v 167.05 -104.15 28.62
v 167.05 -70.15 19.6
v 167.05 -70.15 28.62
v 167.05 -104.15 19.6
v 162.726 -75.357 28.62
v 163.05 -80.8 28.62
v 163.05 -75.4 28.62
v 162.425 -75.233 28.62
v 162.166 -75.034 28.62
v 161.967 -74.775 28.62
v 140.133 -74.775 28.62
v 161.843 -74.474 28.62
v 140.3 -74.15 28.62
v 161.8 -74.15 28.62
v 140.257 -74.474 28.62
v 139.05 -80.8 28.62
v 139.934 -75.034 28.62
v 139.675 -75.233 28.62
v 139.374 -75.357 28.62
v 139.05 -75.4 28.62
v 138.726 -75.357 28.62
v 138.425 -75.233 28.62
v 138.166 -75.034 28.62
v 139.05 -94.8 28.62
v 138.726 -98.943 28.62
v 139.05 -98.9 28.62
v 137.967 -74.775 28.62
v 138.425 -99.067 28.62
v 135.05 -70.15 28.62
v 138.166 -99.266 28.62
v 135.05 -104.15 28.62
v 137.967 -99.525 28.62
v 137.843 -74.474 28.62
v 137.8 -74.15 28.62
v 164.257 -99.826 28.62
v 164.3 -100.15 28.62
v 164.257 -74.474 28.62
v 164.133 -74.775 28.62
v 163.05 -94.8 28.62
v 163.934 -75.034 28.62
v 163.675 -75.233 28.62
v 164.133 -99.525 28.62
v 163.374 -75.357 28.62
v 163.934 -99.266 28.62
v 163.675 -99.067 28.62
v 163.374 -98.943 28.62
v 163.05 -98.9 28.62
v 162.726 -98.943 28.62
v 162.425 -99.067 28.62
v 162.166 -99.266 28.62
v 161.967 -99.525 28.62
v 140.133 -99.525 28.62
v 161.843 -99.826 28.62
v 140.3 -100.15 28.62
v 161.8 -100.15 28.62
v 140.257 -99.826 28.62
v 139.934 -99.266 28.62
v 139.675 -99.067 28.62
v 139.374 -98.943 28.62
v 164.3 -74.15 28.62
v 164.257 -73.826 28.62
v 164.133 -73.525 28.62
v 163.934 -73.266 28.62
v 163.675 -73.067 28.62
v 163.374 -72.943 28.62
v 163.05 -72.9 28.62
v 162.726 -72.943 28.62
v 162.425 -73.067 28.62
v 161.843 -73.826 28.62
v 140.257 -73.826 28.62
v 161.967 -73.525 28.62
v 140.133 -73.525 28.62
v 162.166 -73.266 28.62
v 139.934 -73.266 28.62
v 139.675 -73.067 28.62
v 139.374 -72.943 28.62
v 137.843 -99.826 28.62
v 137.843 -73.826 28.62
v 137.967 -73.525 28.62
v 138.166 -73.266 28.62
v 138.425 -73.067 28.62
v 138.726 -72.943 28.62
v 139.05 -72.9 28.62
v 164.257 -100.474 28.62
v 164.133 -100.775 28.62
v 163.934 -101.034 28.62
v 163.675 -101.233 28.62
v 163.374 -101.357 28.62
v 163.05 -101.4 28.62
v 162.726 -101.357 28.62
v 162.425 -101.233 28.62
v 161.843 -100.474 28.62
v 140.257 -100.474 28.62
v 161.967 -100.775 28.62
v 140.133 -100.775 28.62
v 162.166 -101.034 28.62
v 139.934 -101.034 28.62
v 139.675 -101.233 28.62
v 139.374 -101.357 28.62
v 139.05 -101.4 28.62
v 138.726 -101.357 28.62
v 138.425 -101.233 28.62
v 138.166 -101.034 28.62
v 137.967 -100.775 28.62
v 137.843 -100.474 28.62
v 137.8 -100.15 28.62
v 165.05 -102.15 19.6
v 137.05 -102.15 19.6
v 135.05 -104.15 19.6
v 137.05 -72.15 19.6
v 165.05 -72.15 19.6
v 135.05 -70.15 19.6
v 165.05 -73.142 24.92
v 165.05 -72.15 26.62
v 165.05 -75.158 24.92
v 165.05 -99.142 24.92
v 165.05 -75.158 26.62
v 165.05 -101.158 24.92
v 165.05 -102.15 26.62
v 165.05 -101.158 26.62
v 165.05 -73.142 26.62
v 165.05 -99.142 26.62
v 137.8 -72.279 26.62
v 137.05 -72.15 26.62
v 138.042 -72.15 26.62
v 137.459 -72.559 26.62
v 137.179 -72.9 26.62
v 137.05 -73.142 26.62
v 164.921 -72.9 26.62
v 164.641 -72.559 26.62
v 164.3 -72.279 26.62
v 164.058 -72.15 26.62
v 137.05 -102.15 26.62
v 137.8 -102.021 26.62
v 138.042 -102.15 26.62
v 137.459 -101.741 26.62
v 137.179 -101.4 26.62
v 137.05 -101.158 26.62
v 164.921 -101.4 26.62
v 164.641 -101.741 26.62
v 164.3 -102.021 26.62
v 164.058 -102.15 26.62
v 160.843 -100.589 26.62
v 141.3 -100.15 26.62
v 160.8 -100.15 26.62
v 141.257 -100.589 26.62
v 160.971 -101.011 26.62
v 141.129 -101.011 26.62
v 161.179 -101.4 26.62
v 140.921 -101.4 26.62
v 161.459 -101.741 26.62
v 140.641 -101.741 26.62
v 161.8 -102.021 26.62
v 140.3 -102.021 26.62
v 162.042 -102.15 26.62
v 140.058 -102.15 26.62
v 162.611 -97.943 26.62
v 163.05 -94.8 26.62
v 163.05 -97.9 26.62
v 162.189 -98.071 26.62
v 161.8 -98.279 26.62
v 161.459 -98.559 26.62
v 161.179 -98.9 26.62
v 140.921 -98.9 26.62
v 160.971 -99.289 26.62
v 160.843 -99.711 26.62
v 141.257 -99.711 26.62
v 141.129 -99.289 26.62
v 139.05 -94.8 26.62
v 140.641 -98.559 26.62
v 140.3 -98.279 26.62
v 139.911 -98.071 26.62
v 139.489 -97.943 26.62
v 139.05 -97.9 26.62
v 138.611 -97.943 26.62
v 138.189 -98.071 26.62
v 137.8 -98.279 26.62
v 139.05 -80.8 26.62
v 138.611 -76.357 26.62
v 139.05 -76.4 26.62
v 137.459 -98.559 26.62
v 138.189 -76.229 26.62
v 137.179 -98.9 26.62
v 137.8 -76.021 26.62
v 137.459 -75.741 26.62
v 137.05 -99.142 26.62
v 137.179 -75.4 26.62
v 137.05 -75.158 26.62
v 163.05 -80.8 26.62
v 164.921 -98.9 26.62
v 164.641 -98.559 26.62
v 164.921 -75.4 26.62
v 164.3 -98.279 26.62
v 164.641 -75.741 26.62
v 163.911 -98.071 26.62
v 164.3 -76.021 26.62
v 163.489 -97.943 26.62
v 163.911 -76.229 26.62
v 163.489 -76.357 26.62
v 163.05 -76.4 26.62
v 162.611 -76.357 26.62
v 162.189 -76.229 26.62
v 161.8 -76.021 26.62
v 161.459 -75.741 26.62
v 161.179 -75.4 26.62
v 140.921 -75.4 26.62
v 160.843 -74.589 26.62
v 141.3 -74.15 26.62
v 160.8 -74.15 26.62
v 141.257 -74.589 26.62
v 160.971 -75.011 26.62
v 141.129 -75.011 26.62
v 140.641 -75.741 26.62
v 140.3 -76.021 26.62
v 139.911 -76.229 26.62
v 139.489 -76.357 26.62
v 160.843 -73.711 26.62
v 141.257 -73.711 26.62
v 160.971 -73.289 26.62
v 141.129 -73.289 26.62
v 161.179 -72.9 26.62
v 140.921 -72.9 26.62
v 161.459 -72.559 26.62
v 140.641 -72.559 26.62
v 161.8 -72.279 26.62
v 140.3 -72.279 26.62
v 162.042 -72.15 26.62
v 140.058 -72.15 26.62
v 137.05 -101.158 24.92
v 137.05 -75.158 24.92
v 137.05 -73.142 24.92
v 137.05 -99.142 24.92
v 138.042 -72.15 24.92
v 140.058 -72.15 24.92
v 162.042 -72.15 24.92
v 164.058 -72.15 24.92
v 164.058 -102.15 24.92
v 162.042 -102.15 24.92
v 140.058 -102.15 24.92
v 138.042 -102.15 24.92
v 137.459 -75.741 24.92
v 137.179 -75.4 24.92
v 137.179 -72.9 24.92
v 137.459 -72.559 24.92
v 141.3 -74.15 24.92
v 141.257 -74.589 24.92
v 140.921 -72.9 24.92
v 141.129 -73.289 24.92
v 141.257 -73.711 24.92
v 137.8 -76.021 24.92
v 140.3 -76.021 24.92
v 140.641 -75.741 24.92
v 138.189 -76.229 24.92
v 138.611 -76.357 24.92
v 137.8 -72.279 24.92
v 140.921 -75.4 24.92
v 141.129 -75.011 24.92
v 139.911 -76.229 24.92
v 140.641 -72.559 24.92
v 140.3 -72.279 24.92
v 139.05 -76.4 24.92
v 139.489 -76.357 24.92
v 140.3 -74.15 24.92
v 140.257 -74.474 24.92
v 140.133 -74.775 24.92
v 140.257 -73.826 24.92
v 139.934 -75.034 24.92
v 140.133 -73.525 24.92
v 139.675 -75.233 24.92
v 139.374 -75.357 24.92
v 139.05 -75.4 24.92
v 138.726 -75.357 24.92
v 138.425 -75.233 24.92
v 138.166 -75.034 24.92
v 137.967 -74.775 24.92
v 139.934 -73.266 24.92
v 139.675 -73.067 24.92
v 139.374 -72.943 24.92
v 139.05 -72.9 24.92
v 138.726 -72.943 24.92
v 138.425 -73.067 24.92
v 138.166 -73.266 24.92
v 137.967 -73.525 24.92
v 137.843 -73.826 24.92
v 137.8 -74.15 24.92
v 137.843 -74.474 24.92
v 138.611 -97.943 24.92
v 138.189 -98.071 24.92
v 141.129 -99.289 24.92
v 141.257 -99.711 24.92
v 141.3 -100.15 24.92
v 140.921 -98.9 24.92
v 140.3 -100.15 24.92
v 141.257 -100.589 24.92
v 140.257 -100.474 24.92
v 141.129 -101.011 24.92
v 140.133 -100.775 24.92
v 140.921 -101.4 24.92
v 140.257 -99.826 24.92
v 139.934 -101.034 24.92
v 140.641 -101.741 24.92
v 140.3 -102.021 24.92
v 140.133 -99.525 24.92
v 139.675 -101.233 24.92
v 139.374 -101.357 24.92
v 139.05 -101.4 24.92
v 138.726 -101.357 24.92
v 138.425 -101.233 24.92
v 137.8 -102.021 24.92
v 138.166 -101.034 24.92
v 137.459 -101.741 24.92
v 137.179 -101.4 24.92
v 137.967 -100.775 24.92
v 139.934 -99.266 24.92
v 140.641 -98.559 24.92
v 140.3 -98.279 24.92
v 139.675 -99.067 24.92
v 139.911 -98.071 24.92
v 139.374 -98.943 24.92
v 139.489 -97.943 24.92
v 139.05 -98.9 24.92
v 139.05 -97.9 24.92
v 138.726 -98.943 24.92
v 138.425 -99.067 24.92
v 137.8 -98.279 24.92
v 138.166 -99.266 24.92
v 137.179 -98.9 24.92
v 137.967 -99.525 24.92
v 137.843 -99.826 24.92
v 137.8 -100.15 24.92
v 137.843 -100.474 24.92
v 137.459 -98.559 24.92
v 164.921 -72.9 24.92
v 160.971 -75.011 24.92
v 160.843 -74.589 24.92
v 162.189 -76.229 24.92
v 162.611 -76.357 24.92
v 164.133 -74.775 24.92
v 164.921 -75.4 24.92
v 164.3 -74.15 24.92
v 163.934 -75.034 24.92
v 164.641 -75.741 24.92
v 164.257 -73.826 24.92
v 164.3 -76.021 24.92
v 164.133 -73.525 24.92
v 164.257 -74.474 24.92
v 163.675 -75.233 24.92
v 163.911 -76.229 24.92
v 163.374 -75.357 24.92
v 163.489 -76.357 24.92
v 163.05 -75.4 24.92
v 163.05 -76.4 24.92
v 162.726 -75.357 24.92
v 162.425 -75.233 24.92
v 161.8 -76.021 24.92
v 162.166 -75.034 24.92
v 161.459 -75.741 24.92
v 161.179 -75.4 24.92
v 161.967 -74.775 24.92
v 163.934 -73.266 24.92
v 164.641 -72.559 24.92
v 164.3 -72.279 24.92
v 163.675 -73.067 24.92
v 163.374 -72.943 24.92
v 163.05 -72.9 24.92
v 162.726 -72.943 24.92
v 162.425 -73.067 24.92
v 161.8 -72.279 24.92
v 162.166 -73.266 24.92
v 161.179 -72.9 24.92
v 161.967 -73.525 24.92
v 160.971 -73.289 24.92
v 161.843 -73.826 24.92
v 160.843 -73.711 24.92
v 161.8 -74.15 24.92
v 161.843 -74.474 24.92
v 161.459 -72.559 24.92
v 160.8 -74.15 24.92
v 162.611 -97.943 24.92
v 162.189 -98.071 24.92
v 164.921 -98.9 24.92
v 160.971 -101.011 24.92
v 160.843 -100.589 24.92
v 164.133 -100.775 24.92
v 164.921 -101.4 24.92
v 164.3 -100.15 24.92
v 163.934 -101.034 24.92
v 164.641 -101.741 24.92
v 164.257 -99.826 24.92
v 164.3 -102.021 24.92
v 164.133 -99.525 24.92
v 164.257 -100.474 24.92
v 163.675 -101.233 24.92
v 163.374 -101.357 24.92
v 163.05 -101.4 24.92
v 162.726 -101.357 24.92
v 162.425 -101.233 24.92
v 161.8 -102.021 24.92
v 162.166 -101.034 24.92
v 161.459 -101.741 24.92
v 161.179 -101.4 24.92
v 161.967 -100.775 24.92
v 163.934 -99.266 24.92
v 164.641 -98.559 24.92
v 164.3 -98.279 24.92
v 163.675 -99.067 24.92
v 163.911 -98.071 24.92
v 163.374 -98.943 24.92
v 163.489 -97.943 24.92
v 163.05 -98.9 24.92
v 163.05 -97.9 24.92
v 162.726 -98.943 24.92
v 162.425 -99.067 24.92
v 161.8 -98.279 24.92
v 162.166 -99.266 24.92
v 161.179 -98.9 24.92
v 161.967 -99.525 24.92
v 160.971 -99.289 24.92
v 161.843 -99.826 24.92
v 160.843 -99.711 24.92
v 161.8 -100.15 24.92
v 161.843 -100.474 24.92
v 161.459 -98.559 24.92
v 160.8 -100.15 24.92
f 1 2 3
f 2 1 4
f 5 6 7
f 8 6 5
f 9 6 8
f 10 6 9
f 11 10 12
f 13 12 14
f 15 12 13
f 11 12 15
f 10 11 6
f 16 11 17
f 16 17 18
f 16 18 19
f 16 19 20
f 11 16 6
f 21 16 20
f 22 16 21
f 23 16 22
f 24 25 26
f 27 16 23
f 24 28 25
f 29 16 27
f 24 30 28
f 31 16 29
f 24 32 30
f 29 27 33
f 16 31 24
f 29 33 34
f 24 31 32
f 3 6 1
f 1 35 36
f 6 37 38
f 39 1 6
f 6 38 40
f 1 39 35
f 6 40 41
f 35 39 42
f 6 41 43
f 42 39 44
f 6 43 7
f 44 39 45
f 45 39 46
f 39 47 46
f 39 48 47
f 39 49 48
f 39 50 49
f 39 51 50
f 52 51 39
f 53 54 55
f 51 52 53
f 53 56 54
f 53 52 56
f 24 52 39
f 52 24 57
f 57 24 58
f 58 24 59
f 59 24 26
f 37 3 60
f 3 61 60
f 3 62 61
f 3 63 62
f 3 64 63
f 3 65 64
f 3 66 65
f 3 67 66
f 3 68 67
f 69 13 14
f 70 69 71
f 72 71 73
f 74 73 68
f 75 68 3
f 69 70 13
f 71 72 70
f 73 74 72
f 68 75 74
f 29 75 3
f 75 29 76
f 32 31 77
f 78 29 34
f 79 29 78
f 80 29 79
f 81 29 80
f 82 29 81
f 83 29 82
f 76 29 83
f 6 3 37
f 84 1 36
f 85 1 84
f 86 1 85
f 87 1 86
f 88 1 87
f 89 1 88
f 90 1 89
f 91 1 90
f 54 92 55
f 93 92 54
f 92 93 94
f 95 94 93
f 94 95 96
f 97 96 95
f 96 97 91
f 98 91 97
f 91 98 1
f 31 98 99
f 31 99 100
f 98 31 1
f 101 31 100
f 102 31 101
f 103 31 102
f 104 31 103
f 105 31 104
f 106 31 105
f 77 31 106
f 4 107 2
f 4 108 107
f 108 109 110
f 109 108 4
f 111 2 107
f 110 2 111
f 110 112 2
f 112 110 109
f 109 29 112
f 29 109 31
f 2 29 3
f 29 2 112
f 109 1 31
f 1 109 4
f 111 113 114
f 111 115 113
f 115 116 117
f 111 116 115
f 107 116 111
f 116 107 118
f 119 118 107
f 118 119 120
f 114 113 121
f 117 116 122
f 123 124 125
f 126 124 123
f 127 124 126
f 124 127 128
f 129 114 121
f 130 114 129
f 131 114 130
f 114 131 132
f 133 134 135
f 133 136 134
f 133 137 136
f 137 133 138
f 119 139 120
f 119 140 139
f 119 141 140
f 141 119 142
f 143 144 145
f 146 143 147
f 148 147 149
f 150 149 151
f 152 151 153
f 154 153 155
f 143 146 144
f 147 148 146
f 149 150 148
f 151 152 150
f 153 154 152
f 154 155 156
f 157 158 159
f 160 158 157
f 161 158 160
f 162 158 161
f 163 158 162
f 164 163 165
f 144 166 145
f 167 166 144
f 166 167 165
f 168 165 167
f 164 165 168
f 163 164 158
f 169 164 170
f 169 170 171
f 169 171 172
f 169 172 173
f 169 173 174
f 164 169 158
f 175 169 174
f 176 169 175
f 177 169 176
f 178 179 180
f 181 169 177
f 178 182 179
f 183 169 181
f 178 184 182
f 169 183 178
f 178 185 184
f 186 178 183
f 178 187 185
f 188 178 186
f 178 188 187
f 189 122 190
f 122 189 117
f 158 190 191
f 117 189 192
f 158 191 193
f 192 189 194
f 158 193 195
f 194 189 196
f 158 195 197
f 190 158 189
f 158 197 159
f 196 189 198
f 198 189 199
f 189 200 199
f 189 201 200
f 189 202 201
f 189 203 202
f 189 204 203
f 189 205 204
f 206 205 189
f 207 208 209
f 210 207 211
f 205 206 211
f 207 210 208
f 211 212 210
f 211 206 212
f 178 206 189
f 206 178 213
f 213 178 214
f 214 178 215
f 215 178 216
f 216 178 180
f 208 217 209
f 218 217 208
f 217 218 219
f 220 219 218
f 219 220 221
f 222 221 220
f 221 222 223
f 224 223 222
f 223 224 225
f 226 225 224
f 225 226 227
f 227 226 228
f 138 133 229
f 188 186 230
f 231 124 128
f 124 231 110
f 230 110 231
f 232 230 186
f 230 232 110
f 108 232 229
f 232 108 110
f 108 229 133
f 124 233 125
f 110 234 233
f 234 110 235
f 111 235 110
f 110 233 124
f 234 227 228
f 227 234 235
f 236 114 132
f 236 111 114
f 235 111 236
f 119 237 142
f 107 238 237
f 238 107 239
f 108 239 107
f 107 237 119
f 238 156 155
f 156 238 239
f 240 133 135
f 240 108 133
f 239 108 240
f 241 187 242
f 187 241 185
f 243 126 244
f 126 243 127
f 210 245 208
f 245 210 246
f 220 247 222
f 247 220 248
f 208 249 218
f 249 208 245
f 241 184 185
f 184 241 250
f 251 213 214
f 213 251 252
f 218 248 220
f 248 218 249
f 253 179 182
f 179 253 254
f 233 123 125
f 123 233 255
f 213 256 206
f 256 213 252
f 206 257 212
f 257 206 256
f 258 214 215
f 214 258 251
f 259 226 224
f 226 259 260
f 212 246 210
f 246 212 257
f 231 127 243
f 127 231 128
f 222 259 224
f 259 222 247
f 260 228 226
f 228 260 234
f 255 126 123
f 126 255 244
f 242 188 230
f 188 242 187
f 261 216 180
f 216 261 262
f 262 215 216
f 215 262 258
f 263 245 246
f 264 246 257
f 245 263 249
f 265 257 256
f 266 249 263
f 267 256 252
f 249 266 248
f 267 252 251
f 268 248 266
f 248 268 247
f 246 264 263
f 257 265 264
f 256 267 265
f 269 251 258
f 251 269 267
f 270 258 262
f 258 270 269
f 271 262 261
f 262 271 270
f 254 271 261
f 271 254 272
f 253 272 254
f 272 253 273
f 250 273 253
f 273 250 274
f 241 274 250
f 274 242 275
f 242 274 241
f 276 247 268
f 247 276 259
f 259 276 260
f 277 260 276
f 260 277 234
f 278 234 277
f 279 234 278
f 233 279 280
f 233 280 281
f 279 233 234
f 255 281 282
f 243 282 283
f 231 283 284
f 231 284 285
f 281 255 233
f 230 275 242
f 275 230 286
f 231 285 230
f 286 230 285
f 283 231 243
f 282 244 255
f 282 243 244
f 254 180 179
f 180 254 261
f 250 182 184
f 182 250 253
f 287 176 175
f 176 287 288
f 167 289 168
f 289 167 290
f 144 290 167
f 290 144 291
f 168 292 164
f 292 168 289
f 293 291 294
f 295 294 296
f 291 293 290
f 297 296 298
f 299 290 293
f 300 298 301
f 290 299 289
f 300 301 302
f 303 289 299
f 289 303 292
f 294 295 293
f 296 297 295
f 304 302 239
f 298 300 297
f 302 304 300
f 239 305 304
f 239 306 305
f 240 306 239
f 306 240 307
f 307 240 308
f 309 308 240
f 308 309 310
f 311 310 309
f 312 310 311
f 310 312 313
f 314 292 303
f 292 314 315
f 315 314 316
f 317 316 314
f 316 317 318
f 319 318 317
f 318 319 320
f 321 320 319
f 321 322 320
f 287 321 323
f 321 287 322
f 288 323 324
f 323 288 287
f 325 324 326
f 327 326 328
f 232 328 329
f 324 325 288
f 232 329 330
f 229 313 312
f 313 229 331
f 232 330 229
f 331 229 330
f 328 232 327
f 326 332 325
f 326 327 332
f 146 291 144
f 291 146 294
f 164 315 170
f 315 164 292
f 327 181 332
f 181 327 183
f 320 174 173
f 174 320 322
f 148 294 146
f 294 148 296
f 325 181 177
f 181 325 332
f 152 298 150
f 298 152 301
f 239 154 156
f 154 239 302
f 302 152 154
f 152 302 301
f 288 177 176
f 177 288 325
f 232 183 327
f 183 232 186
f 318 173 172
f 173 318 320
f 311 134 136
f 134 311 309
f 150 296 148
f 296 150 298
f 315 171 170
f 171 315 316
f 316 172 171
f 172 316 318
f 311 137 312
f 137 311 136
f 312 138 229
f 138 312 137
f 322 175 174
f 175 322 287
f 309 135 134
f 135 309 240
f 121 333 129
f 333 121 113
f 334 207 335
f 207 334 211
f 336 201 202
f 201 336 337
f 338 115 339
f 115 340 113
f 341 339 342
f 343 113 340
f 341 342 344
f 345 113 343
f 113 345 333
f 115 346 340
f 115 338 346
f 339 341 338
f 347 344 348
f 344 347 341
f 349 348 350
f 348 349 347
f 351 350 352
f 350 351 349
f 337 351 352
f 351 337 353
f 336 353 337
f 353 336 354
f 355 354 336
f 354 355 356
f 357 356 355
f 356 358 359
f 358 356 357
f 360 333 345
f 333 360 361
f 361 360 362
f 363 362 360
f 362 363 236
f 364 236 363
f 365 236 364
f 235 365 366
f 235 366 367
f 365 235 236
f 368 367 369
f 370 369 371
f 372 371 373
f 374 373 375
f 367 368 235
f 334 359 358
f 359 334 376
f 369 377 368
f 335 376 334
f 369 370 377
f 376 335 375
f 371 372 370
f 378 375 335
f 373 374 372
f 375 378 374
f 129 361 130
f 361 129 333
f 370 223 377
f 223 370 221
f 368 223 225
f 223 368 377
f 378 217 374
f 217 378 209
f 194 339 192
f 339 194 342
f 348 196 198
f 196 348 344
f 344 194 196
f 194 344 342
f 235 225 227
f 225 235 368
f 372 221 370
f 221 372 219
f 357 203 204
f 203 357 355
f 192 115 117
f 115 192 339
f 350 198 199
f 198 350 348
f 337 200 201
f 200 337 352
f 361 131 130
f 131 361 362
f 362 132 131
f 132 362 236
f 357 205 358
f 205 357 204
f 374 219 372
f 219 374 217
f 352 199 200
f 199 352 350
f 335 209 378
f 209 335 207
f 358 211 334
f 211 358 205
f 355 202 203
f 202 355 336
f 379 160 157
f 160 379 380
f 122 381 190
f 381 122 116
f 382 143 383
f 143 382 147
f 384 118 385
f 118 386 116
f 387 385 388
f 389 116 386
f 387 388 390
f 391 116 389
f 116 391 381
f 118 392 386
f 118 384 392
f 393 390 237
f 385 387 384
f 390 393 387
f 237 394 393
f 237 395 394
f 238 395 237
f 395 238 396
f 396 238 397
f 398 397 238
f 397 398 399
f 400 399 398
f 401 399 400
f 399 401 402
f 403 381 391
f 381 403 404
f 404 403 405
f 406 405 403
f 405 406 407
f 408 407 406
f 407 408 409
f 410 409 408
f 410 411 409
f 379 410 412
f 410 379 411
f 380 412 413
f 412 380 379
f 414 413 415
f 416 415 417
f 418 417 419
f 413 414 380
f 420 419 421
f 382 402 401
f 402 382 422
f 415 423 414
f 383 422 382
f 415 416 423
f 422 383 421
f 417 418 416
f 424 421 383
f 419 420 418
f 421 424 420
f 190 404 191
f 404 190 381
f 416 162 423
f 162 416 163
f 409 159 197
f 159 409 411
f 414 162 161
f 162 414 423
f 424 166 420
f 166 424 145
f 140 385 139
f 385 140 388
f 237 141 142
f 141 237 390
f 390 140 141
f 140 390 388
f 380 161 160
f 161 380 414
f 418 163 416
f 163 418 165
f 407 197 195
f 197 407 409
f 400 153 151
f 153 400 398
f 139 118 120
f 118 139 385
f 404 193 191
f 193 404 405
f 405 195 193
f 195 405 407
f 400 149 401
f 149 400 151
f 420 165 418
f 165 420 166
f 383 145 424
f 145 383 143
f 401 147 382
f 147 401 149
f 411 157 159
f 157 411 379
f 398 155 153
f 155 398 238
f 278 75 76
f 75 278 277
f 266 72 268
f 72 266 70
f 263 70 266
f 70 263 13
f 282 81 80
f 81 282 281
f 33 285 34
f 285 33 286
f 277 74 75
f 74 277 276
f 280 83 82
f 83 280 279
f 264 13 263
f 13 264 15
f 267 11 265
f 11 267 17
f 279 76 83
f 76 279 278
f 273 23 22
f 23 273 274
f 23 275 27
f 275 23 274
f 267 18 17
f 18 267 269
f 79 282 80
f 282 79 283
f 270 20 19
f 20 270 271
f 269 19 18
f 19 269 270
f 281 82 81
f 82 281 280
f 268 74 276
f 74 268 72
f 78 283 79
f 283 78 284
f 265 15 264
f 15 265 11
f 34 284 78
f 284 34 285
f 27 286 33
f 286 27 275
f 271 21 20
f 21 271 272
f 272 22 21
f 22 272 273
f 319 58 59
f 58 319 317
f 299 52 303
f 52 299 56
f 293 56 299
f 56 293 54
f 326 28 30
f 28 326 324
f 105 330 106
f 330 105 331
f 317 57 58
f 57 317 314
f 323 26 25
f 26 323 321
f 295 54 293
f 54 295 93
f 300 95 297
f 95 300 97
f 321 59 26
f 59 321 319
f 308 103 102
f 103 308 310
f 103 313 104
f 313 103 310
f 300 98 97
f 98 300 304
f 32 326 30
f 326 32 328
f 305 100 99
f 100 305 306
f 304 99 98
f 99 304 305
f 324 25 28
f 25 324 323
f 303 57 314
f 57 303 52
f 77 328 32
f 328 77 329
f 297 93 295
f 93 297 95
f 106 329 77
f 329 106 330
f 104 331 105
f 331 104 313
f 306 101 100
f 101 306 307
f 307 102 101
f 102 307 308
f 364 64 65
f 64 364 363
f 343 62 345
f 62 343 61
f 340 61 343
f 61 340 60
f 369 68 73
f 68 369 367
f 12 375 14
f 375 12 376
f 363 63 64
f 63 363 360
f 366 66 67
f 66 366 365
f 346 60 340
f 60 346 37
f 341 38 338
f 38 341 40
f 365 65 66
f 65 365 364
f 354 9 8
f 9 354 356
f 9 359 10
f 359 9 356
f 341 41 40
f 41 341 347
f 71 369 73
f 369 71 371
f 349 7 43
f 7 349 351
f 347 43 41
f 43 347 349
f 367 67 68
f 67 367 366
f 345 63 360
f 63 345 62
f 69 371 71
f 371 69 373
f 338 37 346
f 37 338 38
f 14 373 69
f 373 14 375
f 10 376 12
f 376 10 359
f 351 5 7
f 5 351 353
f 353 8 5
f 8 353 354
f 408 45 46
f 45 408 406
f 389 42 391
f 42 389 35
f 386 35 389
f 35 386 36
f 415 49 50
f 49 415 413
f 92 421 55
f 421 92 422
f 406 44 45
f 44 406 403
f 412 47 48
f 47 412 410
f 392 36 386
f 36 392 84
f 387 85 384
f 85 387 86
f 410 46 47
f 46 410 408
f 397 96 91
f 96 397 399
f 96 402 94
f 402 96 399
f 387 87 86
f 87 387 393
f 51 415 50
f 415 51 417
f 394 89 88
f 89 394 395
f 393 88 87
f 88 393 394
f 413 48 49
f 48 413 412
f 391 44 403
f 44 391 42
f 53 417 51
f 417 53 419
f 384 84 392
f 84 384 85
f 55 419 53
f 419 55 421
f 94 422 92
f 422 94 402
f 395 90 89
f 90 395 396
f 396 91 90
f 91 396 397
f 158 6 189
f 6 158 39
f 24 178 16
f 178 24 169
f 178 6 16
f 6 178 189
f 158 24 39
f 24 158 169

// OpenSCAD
// OledView.scad — the OLED housing on its own, the way it sits on the cover (face up).
// It reads CompleteHousing.scad, so every change there appears here on the next reload.
include <CompleteHousing.scad>
part = "oled";
